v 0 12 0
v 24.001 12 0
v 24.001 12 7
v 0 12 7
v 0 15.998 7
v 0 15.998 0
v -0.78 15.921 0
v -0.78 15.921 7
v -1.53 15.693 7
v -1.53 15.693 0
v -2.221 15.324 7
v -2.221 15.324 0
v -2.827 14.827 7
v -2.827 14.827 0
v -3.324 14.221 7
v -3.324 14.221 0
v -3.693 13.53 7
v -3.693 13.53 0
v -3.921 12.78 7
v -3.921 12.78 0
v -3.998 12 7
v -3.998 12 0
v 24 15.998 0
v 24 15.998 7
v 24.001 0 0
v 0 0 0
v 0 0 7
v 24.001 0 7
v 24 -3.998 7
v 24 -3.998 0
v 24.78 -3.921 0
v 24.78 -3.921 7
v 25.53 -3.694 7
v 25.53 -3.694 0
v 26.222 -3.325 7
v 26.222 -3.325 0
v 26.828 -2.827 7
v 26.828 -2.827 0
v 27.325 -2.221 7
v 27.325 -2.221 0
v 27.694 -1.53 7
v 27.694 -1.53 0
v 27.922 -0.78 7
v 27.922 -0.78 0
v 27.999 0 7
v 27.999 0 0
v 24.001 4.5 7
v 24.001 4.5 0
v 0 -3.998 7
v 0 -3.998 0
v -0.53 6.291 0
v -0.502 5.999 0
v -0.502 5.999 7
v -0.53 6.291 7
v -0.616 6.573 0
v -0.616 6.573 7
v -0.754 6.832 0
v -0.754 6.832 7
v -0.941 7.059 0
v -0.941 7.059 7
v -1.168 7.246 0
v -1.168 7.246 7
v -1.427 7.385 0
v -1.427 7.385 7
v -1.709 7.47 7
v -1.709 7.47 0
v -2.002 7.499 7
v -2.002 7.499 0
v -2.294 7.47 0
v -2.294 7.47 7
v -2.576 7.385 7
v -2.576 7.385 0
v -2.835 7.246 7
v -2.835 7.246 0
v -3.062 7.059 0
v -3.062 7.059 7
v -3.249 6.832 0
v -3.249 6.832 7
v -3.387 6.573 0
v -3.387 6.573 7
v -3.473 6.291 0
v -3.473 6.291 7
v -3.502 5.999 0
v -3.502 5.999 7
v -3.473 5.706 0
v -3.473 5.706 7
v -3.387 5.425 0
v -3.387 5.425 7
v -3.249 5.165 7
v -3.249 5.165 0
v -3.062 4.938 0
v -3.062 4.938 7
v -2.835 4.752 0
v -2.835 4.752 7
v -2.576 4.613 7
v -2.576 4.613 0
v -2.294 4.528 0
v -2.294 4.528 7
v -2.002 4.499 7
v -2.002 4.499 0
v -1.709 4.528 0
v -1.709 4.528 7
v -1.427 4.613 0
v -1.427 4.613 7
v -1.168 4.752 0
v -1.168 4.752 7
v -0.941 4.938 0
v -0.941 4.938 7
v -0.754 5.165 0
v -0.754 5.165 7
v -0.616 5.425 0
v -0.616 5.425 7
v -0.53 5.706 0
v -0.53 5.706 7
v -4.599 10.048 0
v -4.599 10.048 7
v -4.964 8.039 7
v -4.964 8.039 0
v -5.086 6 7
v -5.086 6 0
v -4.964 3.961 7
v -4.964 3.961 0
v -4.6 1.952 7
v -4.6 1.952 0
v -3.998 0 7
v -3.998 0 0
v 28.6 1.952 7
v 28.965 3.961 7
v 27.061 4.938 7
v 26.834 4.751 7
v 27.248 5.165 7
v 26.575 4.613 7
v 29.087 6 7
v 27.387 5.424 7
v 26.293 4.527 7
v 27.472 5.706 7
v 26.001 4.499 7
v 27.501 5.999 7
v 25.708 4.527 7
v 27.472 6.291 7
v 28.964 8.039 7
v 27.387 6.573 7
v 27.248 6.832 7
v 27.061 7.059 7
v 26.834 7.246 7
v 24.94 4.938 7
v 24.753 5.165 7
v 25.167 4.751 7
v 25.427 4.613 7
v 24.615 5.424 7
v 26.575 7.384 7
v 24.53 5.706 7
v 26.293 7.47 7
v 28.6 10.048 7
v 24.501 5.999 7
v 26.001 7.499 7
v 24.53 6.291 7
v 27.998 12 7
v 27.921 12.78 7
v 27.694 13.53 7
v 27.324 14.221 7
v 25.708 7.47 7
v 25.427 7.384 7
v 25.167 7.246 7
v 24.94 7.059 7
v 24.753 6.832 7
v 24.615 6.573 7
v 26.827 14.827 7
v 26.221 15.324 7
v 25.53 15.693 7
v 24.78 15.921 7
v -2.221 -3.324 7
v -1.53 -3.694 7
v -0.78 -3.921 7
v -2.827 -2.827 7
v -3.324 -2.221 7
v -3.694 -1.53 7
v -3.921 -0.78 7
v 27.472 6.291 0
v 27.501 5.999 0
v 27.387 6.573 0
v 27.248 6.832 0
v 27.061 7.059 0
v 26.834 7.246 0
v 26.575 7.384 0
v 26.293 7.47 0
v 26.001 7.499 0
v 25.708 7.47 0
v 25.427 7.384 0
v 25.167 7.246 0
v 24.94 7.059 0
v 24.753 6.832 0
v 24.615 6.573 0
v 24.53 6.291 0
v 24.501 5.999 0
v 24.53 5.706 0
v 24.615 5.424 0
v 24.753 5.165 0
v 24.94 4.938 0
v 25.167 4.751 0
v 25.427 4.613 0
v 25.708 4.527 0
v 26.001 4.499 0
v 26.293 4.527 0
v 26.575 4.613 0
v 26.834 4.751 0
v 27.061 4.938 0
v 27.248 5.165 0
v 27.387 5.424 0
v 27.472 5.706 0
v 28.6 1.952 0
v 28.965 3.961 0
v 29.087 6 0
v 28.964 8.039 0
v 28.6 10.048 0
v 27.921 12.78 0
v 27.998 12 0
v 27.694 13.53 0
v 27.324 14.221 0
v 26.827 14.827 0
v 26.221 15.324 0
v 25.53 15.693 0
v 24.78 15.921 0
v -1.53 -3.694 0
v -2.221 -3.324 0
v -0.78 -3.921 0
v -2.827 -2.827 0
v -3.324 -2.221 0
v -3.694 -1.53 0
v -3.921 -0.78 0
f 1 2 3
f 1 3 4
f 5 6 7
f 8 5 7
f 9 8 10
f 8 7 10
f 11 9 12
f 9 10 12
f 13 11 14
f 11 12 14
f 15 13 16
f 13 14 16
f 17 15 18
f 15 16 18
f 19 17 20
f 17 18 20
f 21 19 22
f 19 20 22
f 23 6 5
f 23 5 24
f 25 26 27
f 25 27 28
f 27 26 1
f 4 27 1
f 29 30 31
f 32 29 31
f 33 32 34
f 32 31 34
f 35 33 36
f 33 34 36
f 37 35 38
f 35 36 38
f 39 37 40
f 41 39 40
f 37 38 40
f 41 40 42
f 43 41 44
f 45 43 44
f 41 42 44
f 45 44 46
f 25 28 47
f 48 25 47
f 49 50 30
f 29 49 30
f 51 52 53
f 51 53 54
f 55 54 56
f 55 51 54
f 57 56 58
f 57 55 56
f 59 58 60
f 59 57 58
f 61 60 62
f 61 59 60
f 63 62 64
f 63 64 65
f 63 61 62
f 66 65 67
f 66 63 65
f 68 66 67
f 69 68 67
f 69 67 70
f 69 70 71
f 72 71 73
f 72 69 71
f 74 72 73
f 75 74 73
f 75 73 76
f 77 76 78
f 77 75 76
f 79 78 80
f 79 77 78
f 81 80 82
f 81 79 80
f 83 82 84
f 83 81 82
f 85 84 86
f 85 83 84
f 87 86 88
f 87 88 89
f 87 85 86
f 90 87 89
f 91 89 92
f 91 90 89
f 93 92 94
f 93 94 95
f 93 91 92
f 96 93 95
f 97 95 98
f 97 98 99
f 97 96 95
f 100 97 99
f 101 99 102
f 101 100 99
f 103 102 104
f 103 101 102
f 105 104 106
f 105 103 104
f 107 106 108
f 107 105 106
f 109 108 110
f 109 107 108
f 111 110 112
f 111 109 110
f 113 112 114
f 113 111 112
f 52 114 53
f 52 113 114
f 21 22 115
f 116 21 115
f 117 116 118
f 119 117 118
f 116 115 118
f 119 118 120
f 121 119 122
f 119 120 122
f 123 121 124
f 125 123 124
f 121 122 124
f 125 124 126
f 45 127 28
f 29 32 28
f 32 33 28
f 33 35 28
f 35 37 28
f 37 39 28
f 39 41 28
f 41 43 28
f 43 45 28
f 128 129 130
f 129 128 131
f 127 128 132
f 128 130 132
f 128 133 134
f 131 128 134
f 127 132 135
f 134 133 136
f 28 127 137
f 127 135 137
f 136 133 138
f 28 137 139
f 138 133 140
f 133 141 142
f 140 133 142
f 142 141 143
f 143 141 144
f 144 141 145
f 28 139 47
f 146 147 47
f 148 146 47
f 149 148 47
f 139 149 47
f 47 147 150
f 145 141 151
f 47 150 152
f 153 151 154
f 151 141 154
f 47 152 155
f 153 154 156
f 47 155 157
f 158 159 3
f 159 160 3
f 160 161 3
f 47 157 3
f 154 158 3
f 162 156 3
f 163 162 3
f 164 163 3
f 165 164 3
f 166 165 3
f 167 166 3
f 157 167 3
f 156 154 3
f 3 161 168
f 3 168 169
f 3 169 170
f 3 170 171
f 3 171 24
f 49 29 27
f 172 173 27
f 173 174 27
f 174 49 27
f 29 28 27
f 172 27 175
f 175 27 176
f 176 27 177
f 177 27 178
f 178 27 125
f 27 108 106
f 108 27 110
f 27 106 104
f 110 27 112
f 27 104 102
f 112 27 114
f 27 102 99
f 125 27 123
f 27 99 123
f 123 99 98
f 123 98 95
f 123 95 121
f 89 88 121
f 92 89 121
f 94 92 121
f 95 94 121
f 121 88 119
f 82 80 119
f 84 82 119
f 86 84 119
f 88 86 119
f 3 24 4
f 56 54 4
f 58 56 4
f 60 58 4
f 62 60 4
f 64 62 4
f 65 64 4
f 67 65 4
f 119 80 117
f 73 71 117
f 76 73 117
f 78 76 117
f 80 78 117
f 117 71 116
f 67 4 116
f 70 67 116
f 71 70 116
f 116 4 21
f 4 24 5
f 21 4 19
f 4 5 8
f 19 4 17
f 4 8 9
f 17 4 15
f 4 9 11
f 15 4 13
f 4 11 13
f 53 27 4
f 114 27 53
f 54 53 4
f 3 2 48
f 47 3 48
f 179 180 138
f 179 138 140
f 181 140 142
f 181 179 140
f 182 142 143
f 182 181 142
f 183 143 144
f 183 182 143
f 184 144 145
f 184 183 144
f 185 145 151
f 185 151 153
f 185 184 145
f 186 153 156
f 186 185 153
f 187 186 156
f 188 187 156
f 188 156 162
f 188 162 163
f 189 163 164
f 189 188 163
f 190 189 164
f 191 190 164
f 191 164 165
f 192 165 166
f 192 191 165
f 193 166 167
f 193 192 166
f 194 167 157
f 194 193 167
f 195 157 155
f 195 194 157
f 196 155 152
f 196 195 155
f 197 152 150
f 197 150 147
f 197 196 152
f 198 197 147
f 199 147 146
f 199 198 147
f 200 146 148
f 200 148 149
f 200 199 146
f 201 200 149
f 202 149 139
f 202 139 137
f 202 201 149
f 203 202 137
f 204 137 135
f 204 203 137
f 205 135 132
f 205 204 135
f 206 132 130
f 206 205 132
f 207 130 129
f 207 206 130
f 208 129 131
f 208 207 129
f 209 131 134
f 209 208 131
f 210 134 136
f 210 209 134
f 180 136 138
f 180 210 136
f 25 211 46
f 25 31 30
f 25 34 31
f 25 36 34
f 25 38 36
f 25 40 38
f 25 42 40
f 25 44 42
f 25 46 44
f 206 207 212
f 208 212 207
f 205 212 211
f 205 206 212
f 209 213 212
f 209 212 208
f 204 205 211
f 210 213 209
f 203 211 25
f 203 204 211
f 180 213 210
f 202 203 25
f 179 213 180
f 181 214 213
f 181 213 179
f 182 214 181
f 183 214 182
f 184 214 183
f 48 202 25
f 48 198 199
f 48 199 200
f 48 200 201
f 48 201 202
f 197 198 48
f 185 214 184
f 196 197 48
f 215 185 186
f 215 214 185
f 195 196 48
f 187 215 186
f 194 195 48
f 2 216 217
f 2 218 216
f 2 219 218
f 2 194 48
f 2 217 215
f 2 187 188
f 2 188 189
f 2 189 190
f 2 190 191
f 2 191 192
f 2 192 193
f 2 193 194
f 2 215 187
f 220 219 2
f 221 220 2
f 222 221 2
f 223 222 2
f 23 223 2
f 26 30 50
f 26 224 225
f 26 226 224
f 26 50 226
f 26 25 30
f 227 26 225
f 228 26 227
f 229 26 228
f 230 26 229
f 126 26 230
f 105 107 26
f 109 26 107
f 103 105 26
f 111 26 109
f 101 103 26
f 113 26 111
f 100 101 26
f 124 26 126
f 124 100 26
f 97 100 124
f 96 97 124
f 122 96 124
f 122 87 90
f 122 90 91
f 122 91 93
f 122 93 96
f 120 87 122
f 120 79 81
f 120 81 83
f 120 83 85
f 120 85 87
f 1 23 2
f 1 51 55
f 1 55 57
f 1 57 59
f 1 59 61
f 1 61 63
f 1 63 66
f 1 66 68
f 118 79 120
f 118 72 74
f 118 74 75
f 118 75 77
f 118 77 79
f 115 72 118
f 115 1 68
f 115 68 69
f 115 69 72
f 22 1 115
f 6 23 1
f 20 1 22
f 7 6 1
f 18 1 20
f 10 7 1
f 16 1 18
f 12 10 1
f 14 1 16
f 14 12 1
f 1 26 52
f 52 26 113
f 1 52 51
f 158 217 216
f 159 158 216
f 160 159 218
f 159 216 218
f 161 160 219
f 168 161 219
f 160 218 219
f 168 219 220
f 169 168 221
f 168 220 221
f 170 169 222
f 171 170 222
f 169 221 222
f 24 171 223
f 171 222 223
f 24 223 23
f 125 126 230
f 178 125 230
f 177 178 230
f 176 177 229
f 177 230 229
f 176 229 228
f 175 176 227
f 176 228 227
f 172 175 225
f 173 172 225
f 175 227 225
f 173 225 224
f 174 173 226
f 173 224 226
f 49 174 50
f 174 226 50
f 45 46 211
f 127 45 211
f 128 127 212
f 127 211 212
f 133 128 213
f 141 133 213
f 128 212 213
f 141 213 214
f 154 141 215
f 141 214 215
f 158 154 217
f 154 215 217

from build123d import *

# Parameters (mm, degrees)
SKETCH_R  = 1.5
PAD_DEPTH = 7


with BuildPart() as part:
    # Sketch → Pad (new body)
    with BuildSketch(Plane.XY):
        with BuildLine():
            Line((0, 15.997543), (24, 15.997543))
            ThreePointArc((27.998177, 11.999997), (26.8271, 14.826912), (24, 15.997543))
            ThreePointArc((27.998811, 0), (29.086586, 6.000056), (27.998177, 11.999997))
            ThreePointArc((24, -3.998177), (26.827548, -2.827362), (27.998811, 0))
            Line((0, -3.998177), (24, -3.998177))
            ThreePointArc((-3.998177, 0), (-2.827138, -2.827138), (0, -3.998177))
            ThreePointArc((-3.997546, 11.999992), (-5.086015, 6.000054), (-3.998177, 0))
            ThreePointArc((0, 15.997543), (-2.826693, 14.826687), (-3.997546, 11.999992))
        make_face()
        with Locations((-2.001505, 5.998805)):
            Circle(SKETCH_R, mode=Mode.SUBTRACT)
        with Locations((26.000681, 5.998509)):
            Circle(SKETCH_R, mode=Mode.SUBTRACT)
        Polygon((0, 0), (24.000633, 0), (24.000632, 4.5), (24.000632, 7.5), (24.000632, 11.999997), (0, 11.999997), (0, 7.5), (0, 4.5), align=None, mode=Mode.SUBTRACT)
    extrude(amount=PAD_DEPTH)


solid = part.part
